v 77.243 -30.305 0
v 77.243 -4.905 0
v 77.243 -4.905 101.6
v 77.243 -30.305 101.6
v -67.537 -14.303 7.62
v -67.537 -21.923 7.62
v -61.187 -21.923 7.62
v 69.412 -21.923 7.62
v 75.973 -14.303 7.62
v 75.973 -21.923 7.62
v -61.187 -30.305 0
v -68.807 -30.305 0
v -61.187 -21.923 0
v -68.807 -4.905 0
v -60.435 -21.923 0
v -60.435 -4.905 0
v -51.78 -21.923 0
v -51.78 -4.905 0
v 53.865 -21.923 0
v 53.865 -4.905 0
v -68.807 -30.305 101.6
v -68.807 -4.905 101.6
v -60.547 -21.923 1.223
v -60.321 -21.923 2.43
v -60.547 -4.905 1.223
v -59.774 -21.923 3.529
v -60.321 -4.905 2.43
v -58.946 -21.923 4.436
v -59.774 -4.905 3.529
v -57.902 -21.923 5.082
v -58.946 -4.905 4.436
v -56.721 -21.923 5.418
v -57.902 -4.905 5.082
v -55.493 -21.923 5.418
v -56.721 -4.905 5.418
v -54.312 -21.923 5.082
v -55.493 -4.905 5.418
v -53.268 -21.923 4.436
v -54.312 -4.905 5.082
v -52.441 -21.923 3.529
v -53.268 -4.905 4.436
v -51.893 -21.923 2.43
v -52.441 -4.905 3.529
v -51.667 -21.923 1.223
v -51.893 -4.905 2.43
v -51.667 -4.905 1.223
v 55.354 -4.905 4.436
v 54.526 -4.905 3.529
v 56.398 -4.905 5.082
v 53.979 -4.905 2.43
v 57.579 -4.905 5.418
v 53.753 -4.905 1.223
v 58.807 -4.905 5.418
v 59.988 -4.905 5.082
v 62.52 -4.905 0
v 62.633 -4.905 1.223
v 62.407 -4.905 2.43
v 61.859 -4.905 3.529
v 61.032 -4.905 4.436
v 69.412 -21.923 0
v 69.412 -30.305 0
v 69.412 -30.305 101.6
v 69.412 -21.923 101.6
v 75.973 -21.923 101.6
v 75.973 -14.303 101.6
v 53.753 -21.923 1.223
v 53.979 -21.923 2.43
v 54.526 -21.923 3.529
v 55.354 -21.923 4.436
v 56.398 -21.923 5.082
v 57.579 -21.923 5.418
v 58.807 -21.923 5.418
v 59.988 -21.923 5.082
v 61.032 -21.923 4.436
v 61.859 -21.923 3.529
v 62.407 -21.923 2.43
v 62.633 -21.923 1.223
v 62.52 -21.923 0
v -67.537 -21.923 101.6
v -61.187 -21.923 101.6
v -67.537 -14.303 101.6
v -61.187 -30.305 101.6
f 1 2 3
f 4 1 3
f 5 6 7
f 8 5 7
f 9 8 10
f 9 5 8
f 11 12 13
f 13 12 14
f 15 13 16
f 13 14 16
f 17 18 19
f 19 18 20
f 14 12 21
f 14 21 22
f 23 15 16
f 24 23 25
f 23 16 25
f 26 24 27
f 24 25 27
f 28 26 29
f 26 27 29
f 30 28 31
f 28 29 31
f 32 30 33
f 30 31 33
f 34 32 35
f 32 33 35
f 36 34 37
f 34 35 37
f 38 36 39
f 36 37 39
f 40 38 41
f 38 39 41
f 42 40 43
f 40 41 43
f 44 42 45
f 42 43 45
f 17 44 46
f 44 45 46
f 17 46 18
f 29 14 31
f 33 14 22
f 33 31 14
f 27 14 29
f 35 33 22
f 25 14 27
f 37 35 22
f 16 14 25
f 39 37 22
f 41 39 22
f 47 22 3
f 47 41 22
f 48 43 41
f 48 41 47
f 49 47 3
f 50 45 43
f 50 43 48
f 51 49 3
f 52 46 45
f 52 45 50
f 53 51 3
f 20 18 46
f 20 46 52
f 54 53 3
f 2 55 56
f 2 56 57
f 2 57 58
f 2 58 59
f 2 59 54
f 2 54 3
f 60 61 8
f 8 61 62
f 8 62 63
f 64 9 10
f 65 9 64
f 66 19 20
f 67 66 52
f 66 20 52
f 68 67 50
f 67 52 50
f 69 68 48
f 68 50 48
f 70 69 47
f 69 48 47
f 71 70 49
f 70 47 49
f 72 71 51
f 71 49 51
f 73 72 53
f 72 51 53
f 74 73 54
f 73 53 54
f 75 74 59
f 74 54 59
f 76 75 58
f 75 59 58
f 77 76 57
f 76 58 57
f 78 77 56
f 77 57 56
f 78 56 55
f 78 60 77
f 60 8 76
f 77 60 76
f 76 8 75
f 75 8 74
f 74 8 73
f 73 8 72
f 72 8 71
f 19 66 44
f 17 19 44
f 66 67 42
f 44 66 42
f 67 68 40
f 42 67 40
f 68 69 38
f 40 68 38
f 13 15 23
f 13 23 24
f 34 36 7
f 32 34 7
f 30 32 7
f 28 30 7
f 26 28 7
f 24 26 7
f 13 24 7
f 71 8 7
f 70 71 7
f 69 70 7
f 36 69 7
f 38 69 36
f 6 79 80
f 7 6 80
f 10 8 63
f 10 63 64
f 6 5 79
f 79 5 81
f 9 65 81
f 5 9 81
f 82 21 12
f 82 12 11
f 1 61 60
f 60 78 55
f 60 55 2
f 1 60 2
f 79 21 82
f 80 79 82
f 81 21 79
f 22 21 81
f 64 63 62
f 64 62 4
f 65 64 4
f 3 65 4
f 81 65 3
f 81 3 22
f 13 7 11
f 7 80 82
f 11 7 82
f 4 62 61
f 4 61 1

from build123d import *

# Parameters (mm, degrees)
F0_W     = 146.05
F0_H     = 25.4
F1_DEPTH = 101.6
F3_DEPTH = 93.98
F5_DEPTH = 101.601
F6_R     = 4.445
F7_DEPTH = 25.401
F8_W     = 1.27
F8_H     = 93.98
F9_DEPTH = 7.62


with BuildPart() as f1:
    # F0 (on Top) → F1 (new body)
    with BuildSketch(Plane.XY):
        with Locations((4.217781, -17.604944)):
            Rectangle(F0_W, F0_H)
    extrude(amount=F1_DEPTH)

    # F2 (on face) → F3 (cut)
    with BuildSketch(Plane.XY.offset(101.6)):
        Polygon((77.242781, -14.302944), (-63.299149, -14.302944), (-68.807219, -14.302944), (-68.807219, -21.922944), (-63.299149, -21.922944), (77.242781, -21.922944), align=None)
    extrude(amount=-F3_DEPTH, mode=Mode.SUBTRACT)

    # F4 (on face) → F5 (cut, through all)
    with BuildSketch(Plane.XY.offset(101.6)):
        Polygon((-61.187219, -21.922944), (-61.187219, -26.113944), (-61.187219, -30.304944), (69.411784, -30.304944), (69.411784, -26.113944), (69.411784, -21.922944), align=None)
    extrude(amount=-F5_DEPTH, mode=Mode.SUBTRACT)

    # F6 (on face) → F7 (cut, through all)
    with BuildSketch(Plane(origin=(0, -4.904944, 0), x_dir=(-1, 0, 0), z_dir=(0, 1, 0))):
        with Locations((-58.192781, 1.016)):
            Circle(F6_R)
        with Locations((56.107219, 1.016)):
            Circle(F6_R)
    extrude(amount=-F7_DEPTH, mode=Mode.SUBTRACT)

    # F8 (on face) → F9 (join)
    with BuildSketch(Plane.XZ.offset(14.302944)):
        with Locations((76.607781, 54.61)):
            Rectangle(F8_W, F8_H)
        with Locations((-68.172219, 54.61)):
            Rectangle(F8_W, F8_H)
    extrude(amount=F9_DEPTH)


solid = f1.part
